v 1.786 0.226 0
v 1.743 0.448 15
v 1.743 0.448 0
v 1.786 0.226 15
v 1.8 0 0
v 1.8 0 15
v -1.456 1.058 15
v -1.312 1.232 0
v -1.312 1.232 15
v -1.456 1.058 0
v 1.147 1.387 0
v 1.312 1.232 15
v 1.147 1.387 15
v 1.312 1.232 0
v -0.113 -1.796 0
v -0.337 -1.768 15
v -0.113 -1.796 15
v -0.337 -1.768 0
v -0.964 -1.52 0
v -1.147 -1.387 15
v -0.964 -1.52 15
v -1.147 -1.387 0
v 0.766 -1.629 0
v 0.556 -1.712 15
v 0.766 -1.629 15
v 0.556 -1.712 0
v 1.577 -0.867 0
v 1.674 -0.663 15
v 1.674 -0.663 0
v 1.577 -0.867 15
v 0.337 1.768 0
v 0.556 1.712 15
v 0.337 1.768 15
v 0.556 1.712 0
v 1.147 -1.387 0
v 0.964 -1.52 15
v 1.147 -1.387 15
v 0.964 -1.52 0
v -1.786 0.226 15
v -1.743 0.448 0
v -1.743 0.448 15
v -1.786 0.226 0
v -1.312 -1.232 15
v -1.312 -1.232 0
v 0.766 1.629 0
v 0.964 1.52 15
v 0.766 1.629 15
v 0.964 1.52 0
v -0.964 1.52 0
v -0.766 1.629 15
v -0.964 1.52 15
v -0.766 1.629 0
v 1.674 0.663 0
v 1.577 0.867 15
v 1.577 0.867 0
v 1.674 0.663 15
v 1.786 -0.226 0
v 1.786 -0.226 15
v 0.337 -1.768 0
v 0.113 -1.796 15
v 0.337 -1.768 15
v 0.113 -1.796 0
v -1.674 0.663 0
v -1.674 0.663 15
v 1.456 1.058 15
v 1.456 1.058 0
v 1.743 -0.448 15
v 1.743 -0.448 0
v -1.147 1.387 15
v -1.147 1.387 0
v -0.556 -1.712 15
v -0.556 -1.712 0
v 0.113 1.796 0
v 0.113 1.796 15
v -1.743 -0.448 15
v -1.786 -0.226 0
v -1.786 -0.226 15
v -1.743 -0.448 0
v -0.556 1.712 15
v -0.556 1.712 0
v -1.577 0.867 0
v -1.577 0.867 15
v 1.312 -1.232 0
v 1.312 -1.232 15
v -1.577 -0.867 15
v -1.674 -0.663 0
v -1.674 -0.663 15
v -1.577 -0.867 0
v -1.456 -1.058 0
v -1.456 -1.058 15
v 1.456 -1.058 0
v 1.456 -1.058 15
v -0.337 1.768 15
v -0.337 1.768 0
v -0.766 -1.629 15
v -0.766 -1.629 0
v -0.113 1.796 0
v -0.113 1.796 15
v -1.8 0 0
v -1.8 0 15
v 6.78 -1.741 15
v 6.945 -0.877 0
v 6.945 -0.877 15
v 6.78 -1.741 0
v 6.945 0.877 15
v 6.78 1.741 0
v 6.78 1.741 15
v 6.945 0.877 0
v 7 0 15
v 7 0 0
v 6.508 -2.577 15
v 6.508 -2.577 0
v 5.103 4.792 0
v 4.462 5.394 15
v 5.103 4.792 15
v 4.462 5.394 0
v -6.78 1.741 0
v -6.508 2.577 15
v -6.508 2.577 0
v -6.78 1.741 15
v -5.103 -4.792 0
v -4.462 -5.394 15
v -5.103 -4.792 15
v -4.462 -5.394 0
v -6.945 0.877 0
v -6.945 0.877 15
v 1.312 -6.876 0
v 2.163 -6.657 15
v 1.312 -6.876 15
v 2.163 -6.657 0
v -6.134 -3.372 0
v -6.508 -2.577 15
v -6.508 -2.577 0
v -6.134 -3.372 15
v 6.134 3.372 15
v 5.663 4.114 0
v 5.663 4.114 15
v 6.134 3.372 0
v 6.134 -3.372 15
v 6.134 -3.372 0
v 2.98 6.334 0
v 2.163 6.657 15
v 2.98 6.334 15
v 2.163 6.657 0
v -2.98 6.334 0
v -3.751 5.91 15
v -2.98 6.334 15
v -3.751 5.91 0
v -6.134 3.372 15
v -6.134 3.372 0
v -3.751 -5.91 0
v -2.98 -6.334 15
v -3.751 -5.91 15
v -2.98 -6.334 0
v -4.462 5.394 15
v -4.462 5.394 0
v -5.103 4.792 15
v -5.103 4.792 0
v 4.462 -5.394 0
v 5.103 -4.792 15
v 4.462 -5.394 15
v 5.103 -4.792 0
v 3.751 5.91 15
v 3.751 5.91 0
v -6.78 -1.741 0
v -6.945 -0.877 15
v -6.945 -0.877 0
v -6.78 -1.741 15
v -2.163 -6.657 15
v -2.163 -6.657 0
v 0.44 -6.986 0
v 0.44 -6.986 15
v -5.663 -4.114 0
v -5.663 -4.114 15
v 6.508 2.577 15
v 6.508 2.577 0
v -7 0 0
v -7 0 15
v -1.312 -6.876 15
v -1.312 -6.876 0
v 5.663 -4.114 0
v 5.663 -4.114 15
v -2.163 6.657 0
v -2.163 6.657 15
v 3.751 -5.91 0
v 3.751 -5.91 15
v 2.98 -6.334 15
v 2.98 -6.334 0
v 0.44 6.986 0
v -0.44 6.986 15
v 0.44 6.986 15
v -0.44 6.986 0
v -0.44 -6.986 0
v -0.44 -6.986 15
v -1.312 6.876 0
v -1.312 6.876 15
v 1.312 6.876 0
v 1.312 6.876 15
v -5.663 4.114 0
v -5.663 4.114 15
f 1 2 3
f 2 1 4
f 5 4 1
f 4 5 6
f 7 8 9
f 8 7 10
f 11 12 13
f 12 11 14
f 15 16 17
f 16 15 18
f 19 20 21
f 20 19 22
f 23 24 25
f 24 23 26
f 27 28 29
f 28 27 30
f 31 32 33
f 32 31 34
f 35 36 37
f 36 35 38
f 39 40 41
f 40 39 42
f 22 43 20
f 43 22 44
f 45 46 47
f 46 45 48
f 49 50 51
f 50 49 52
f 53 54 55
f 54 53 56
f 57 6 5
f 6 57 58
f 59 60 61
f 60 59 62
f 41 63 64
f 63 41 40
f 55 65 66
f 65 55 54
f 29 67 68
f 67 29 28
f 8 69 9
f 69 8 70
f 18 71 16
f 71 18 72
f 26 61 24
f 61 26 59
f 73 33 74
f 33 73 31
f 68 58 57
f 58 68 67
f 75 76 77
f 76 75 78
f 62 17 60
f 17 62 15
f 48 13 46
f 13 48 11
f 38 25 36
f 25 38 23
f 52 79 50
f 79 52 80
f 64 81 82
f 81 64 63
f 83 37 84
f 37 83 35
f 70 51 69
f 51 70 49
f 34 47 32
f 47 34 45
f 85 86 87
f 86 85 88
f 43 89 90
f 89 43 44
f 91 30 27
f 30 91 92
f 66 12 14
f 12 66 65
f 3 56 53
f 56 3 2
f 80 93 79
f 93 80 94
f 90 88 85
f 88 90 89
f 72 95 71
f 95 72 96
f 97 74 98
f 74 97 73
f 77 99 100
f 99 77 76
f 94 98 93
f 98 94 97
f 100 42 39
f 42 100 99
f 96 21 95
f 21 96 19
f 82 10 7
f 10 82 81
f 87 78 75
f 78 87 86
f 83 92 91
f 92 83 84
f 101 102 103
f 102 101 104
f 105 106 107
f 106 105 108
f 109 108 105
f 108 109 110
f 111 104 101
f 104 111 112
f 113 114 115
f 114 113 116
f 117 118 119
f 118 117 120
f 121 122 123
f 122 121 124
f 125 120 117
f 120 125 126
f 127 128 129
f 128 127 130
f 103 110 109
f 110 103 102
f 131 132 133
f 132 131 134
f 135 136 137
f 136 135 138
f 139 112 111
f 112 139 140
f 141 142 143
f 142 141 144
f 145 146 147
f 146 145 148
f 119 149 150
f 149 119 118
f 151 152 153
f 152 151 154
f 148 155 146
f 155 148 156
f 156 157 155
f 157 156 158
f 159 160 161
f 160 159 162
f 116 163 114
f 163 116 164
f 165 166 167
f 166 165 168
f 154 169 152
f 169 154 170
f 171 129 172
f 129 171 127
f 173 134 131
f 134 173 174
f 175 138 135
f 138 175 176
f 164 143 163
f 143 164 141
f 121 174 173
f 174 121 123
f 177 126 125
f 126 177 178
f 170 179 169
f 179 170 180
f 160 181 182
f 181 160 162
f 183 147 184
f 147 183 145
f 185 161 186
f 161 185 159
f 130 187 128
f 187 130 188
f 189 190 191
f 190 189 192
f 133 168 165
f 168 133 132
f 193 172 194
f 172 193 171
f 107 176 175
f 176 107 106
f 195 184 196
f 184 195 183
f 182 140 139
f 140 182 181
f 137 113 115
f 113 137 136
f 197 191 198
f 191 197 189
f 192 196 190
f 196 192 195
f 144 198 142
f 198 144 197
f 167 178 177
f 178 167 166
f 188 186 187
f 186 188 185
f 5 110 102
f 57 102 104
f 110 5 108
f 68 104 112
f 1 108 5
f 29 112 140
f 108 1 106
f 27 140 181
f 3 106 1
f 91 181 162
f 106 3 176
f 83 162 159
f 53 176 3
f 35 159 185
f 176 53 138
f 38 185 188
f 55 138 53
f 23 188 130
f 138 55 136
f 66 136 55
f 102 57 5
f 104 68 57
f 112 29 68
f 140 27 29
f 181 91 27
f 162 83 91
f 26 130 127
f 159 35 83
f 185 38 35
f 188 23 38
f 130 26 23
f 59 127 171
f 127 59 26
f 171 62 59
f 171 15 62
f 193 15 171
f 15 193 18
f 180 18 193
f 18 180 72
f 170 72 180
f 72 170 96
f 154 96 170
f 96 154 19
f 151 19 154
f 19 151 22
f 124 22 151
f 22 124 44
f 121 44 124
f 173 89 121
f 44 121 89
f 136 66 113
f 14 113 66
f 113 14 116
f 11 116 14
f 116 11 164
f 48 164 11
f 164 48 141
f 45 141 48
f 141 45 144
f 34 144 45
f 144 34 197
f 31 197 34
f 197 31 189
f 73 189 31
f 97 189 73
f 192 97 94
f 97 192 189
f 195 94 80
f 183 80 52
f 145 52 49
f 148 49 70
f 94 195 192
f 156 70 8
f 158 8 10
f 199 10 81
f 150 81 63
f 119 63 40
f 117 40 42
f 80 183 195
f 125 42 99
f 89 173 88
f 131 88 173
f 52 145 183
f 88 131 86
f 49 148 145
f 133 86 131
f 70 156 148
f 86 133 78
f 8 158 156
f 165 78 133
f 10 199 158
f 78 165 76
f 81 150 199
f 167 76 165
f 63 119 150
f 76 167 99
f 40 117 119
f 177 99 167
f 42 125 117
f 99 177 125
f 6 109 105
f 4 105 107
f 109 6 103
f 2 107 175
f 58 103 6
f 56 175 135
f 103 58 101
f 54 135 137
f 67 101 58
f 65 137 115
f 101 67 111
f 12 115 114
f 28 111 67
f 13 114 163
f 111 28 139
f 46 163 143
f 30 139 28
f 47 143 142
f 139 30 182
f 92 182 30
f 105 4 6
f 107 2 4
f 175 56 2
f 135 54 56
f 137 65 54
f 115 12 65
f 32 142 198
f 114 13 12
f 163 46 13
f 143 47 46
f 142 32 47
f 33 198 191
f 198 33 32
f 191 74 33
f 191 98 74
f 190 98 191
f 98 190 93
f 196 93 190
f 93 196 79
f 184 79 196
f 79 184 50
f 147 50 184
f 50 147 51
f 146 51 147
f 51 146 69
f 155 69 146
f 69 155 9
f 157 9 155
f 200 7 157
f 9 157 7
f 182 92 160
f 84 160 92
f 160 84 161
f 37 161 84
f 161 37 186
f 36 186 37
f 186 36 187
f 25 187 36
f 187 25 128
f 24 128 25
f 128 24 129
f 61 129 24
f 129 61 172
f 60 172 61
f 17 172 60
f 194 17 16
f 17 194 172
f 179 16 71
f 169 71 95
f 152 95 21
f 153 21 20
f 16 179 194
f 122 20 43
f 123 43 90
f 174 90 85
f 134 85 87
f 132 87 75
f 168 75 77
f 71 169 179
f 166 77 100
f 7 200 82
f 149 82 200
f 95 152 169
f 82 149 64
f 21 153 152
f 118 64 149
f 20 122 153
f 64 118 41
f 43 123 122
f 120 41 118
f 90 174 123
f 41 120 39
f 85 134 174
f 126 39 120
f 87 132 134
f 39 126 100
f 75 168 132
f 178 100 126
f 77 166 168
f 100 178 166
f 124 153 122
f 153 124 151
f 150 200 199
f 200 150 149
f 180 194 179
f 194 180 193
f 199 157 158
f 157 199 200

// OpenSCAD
$fn = 50;


difference() {
	union() {
		cylinder(h = 15, r = 7.0000000000);
	}
	union() {
		translate(v = [0, 0, -100]) {
			cylinder(h = 200, r = 1.8000000000);
		}
		translate(v = [0, 0, -100]) {
			cylinder(h = 200, r = 1.8000000000);
		}
	}
}
